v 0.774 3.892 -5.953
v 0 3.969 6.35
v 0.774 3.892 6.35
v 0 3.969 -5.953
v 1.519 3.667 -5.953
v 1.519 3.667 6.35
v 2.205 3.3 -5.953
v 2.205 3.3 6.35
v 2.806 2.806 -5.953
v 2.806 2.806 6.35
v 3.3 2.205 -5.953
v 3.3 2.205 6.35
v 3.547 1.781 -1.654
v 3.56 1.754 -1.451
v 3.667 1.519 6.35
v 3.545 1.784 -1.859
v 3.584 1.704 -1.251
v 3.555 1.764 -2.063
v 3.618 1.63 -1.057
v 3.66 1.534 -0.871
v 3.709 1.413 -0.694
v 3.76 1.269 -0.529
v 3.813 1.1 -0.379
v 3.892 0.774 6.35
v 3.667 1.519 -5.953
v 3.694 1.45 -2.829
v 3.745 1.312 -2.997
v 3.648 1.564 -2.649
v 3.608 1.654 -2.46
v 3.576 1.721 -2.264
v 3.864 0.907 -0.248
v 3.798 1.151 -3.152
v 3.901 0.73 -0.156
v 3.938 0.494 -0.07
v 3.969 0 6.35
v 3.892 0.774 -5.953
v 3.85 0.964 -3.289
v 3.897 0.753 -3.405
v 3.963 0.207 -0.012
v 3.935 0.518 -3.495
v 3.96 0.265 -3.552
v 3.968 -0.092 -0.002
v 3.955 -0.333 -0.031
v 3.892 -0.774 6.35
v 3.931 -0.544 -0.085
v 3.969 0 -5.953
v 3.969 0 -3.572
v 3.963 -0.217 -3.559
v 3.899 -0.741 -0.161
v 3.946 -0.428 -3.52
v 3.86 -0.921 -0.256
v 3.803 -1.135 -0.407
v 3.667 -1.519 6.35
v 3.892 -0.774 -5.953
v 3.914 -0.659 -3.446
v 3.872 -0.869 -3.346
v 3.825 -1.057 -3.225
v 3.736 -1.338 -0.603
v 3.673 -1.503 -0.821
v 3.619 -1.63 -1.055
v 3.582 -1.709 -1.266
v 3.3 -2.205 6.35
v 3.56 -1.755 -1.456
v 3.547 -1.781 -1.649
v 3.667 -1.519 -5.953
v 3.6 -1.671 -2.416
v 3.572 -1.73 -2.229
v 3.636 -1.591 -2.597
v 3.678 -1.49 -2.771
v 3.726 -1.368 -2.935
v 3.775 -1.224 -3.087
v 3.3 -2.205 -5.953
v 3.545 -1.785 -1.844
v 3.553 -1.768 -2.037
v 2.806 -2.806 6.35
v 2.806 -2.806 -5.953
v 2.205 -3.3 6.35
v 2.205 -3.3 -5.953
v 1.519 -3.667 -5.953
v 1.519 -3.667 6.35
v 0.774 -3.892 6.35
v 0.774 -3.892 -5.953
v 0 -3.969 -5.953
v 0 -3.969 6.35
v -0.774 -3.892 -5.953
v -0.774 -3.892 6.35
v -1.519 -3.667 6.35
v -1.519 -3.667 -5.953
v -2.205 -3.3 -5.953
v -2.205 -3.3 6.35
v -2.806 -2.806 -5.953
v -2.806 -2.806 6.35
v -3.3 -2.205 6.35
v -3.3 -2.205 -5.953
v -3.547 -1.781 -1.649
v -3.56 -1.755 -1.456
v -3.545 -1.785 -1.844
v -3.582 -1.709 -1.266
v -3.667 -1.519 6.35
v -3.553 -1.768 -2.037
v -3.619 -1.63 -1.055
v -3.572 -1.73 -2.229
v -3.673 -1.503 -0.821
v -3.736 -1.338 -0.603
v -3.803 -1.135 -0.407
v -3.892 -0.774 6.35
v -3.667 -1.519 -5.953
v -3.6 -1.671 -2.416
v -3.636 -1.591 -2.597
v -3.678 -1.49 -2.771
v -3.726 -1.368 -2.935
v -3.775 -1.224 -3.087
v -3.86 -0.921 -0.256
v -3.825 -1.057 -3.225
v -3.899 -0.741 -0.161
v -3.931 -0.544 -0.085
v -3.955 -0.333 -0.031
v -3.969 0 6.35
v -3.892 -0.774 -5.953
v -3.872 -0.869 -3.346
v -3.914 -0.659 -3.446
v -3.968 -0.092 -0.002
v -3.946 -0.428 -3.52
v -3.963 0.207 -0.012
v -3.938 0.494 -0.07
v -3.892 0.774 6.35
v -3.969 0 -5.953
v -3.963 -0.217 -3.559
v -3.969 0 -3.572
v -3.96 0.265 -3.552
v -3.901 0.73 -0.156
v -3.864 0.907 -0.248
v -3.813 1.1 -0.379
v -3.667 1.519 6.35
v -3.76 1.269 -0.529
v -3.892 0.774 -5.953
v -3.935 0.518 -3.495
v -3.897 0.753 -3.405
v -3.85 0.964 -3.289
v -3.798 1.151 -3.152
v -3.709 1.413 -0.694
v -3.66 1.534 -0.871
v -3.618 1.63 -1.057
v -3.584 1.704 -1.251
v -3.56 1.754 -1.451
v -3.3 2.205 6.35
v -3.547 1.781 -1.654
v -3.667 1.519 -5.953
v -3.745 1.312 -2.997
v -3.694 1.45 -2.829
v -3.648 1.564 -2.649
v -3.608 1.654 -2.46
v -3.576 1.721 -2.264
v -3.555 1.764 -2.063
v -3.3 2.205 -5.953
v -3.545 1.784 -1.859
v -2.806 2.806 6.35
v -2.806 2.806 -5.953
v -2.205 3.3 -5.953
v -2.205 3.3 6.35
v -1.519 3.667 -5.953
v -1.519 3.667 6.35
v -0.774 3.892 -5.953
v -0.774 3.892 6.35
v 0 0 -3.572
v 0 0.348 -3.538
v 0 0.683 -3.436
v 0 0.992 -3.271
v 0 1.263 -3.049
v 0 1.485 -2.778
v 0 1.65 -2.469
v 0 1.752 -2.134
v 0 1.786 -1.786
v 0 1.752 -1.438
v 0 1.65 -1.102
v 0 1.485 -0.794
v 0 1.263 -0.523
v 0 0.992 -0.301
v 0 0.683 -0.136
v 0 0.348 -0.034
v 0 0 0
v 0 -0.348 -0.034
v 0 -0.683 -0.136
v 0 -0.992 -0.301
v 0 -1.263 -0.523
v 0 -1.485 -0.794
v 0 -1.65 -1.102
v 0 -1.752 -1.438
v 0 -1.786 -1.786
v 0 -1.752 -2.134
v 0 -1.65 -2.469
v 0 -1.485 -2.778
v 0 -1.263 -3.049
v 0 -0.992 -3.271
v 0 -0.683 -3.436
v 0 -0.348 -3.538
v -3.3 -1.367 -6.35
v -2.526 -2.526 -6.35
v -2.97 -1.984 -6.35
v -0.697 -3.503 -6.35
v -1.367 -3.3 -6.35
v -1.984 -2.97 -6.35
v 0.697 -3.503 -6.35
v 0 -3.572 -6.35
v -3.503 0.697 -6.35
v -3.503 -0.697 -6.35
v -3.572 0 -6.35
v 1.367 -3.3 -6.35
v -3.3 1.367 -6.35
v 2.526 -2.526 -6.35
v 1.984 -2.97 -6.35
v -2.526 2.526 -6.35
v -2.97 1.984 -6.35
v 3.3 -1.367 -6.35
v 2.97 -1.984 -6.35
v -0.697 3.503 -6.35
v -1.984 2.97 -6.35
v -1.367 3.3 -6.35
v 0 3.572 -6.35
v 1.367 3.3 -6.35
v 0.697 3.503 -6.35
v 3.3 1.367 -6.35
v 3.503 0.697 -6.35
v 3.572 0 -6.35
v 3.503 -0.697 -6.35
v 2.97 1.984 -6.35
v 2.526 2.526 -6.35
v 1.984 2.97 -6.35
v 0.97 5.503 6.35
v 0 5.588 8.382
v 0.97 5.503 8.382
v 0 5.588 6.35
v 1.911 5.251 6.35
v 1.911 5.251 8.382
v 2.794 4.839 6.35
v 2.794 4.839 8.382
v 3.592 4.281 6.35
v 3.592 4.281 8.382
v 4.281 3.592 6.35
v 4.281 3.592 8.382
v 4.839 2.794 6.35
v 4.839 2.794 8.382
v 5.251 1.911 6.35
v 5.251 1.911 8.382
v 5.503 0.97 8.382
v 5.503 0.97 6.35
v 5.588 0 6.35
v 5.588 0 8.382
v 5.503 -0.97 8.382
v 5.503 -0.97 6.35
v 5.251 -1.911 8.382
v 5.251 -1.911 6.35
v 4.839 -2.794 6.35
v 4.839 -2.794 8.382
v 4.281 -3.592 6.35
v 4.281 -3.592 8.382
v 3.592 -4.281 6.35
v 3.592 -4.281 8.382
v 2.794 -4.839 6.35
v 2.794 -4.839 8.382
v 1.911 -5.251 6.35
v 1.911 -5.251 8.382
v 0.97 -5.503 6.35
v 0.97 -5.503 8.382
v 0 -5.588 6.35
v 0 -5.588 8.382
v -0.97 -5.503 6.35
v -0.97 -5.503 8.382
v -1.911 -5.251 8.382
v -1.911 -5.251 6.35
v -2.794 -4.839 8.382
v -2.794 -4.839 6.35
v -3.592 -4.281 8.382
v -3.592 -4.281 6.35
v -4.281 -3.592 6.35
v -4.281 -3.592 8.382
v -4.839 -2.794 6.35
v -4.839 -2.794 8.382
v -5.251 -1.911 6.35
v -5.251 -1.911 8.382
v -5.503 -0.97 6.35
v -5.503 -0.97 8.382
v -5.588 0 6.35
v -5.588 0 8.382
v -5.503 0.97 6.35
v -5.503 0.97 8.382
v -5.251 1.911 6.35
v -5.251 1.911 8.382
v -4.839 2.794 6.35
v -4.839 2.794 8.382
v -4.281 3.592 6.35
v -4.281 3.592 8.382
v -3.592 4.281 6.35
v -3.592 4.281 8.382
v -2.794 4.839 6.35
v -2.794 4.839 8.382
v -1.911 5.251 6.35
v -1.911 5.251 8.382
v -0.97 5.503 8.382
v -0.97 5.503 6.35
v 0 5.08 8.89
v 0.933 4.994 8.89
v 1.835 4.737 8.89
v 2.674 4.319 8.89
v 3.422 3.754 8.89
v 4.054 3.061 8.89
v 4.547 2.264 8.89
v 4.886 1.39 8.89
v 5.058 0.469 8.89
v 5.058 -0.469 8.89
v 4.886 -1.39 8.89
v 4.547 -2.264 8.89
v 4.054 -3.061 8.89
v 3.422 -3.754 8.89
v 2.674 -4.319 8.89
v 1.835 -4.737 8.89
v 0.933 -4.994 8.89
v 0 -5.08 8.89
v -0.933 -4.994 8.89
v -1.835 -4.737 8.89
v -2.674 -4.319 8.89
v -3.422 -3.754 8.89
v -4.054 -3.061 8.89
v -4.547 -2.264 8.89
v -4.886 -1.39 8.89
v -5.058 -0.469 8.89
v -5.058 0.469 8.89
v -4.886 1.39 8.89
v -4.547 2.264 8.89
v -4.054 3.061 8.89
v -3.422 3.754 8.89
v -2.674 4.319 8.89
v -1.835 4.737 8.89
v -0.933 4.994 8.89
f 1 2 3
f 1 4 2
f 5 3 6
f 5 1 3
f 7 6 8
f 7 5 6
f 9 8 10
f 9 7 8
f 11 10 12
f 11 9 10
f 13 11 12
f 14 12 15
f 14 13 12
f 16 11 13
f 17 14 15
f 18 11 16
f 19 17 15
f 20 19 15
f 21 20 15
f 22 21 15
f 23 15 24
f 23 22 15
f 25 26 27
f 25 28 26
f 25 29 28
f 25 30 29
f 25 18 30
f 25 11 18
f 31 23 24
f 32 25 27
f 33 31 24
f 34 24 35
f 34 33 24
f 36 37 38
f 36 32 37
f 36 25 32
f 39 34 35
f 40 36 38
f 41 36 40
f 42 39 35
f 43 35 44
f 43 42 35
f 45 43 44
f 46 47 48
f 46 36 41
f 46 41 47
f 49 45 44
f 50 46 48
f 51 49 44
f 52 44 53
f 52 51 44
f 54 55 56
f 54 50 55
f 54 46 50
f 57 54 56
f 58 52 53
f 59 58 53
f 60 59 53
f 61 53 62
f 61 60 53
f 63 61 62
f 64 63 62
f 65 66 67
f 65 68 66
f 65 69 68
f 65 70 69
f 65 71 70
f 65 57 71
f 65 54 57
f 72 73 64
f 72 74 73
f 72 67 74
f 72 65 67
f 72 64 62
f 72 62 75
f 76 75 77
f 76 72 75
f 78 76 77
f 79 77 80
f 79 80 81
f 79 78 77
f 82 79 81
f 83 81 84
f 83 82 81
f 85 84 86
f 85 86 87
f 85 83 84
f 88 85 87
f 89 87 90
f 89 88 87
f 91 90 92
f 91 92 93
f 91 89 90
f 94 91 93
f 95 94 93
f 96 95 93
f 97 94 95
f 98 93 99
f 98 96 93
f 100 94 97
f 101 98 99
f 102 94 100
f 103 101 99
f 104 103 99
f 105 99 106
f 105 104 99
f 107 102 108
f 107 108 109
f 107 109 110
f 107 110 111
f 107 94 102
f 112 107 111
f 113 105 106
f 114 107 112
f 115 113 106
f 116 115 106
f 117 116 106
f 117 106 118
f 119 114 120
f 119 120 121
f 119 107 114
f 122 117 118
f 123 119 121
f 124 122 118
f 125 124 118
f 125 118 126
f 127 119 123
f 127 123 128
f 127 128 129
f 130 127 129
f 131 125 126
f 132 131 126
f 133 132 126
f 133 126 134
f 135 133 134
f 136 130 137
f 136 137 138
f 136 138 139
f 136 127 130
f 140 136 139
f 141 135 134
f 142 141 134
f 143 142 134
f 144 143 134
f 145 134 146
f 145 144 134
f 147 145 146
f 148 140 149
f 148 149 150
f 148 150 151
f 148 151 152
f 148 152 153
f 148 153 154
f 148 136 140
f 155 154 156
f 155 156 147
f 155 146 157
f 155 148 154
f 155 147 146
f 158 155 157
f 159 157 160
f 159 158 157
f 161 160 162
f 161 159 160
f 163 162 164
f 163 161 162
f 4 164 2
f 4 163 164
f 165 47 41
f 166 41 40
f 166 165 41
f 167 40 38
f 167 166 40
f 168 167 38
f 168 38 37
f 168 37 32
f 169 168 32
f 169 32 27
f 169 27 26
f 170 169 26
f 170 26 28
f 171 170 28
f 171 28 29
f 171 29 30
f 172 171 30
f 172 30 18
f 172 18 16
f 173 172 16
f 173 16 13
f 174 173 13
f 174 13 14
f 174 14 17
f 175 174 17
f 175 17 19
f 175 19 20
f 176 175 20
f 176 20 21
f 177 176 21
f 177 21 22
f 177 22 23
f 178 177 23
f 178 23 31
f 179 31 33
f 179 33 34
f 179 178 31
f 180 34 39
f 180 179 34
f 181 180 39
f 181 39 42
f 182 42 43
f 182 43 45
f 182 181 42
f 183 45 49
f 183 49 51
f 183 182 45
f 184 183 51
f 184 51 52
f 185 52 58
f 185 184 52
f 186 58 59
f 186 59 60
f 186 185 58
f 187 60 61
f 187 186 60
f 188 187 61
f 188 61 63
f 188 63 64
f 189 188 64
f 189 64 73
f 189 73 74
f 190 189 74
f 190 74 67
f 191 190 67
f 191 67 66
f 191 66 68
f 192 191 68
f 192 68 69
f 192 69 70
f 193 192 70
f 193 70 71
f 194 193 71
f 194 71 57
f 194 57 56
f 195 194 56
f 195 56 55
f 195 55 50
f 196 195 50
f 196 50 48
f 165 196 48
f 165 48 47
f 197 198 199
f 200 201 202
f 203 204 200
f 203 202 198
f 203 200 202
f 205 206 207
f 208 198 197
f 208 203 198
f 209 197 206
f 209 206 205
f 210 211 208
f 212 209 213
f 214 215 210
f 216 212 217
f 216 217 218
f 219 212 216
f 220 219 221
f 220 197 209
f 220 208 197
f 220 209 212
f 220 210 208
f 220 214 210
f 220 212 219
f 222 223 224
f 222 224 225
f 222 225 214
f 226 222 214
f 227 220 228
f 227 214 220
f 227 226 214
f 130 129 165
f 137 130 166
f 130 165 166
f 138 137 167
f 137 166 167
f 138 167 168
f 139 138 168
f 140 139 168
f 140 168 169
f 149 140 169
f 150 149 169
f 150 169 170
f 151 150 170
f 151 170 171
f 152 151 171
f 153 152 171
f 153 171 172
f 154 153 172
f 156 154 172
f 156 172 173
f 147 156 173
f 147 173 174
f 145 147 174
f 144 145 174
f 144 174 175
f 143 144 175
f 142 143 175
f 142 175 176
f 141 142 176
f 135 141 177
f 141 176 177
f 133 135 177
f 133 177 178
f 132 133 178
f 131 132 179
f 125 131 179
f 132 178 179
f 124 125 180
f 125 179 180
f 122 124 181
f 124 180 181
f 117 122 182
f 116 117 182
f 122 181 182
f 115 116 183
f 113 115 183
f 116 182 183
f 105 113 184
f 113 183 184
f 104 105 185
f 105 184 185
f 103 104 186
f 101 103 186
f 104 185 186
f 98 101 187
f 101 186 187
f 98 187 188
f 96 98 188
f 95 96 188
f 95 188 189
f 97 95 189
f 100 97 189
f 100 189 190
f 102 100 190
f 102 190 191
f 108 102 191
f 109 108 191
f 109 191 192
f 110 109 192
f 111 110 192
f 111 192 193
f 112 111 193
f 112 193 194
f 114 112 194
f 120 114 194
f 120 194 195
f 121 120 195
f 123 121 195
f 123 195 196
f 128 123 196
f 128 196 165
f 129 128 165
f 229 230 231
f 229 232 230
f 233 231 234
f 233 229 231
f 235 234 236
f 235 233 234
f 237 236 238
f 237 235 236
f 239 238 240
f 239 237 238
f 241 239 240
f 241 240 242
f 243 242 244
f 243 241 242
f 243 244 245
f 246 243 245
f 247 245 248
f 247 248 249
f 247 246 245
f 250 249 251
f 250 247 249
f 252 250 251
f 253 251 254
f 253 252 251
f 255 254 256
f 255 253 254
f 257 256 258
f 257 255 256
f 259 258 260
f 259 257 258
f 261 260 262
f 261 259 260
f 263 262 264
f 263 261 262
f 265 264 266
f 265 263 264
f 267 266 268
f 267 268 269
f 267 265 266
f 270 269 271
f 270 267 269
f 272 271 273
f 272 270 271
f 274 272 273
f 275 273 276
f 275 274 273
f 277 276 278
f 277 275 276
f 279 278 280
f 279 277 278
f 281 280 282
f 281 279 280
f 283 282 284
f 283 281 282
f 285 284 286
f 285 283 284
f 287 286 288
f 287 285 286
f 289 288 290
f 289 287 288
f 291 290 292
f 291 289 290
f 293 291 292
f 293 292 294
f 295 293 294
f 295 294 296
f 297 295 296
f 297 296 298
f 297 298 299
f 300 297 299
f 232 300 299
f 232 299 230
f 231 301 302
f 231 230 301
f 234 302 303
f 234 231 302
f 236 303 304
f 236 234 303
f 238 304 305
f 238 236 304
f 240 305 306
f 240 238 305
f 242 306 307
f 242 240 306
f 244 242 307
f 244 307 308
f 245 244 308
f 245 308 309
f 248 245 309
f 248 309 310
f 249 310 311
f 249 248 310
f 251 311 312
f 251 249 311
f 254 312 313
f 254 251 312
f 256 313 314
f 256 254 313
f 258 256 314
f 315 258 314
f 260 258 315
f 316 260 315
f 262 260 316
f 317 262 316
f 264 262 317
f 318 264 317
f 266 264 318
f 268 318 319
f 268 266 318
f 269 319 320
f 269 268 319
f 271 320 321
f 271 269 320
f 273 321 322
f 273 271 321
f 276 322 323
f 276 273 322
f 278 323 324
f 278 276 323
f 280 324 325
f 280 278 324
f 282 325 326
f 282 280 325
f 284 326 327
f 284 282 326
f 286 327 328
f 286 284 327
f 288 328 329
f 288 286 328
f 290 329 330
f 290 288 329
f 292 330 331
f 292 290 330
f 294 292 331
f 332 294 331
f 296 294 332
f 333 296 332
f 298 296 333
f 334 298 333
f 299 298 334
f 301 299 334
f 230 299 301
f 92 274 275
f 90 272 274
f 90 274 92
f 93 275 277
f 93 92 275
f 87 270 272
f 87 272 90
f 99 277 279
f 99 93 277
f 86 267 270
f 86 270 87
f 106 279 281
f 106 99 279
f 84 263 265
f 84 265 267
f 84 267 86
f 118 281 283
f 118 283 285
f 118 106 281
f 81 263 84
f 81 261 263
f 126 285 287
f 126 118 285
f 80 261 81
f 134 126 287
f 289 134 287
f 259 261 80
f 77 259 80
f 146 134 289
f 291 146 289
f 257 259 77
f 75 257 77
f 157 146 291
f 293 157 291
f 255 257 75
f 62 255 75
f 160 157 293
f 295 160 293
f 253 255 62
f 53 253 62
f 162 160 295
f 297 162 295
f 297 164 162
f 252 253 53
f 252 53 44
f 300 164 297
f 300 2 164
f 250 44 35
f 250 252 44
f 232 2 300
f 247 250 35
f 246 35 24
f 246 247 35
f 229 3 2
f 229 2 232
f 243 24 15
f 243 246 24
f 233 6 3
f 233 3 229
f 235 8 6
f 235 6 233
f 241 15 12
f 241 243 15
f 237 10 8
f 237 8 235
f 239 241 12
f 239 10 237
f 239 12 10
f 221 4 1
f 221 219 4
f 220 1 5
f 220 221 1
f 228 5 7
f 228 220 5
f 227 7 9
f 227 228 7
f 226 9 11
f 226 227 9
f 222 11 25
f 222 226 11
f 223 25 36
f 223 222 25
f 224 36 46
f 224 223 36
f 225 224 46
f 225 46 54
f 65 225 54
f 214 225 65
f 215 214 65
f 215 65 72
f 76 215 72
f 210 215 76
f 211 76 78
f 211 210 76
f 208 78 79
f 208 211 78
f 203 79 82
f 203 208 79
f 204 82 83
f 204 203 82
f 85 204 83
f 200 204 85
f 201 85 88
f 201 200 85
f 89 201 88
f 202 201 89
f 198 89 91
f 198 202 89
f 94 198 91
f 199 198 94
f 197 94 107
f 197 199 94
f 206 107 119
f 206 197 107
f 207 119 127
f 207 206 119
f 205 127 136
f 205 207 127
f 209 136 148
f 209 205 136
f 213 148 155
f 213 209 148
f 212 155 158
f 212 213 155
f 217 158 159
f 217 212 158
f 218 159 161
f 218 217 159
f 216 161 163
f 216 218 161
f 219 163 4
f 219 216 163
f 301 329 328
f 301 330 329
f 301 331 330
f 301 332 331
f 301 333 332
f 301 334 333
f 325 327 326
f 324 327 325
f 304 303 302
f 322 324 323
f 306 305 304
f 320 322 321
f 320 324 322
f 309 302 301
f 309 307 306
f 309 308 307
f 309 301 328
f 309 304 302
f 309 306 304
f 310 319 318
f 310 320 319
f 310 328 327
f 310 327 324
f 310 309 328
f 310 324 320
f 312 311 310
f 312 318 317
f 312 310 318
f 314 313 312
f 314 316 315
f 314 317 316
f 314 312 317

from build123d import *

# Parameters (mm, degrees)
SKETCH11_R              = 1.7859375
CUT_EXTRUDE1_DEPTH      = 6.588
CUT_EXTRUDE1_DEPTH_BACK = 6.588


with BuildPart() as part:
    # Sketch10 → Revolve1 (revolve)
    with BuildSketch(Plane(origin=(0, 0, 0), x_dir=(0, 0, -1), z_dir=(1, 0, 0))):
        Polygon((6.35, 3.571875), (6.35, 0), (-8.89, 0), (-8.89, 5.08), (-8.382, 5.588), (-6.35, 5.588), (-6.35, 3.96875), (5.953125, 3.96875), align=None)
    revolve(axis=Axis((0, 0, 6.35), (0, 0, -1)))

    # Sketch11 → Cut-Extrude1 (cut, two sides)
    with BuildSketch(Plane(origin=(0, 0, 0), x_dir=(0, 0, -1), z_dir=(1, 0, 0))) as cut_extrude1_sk:
        with Locations((1.7859375, 0)):
            Circle(SKETCH11_R)
    extrude(amount=CUT_EXTRUDE1_DEPTH, mode=Mode.SUBTRACT)
    extrude(cut_extrude1_sk.sketch, amount=-CUT_EXTRUDE1_DEPTH_BACK, mode=Mode.SUBTRACT)


solid = part.part
